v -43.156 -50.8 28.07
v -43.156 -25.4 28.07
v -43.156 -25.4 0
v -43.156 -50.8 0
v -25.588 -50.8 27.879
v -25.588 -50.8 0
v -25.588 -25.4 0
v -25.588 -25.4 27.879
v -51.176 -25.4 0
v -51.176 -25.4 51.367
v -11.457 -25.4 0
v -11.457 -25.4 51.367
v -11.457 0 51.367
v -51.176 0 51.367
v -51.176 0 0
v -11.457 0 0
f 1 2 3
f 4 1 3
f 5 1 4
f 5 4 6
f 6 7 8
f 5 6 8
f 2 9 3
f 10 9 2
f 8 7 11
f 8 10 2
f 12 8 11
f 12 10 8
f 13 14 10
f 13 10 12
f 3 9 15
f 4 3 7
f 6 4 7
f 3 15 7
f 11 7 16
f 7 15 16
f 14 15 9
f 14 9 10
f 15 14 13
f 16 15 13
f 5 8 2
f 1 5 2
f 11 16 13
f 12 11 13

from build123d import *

# Parameters (mm, degrees)
F0_W     = 39.718569
F0_H     = 51.366802
F1_DEPTH = 25.4
F3_DEPTH = 25.4


with BuildPart() as f1:
    # F0 (on Front) → F1 (new body)
    with BuildSketch(Plane.XZ):
        with Locations((-31.316563, 25.683401)):
            Rectangle(F0_W, F0_H)
    extrude(amount=F1_DEPTH)

    # F2 (on face) → F3 (join)
    with BuildSketch(Plane.XZ.offset(25.4)):
        Polygon((-25.587924, 27.87938), (-43.155752, 28.070334), (-43.155752, 0), (-25.587924, 0), align=None)
    extrude(amount=F3_DEPTH)


solid = f1.part
